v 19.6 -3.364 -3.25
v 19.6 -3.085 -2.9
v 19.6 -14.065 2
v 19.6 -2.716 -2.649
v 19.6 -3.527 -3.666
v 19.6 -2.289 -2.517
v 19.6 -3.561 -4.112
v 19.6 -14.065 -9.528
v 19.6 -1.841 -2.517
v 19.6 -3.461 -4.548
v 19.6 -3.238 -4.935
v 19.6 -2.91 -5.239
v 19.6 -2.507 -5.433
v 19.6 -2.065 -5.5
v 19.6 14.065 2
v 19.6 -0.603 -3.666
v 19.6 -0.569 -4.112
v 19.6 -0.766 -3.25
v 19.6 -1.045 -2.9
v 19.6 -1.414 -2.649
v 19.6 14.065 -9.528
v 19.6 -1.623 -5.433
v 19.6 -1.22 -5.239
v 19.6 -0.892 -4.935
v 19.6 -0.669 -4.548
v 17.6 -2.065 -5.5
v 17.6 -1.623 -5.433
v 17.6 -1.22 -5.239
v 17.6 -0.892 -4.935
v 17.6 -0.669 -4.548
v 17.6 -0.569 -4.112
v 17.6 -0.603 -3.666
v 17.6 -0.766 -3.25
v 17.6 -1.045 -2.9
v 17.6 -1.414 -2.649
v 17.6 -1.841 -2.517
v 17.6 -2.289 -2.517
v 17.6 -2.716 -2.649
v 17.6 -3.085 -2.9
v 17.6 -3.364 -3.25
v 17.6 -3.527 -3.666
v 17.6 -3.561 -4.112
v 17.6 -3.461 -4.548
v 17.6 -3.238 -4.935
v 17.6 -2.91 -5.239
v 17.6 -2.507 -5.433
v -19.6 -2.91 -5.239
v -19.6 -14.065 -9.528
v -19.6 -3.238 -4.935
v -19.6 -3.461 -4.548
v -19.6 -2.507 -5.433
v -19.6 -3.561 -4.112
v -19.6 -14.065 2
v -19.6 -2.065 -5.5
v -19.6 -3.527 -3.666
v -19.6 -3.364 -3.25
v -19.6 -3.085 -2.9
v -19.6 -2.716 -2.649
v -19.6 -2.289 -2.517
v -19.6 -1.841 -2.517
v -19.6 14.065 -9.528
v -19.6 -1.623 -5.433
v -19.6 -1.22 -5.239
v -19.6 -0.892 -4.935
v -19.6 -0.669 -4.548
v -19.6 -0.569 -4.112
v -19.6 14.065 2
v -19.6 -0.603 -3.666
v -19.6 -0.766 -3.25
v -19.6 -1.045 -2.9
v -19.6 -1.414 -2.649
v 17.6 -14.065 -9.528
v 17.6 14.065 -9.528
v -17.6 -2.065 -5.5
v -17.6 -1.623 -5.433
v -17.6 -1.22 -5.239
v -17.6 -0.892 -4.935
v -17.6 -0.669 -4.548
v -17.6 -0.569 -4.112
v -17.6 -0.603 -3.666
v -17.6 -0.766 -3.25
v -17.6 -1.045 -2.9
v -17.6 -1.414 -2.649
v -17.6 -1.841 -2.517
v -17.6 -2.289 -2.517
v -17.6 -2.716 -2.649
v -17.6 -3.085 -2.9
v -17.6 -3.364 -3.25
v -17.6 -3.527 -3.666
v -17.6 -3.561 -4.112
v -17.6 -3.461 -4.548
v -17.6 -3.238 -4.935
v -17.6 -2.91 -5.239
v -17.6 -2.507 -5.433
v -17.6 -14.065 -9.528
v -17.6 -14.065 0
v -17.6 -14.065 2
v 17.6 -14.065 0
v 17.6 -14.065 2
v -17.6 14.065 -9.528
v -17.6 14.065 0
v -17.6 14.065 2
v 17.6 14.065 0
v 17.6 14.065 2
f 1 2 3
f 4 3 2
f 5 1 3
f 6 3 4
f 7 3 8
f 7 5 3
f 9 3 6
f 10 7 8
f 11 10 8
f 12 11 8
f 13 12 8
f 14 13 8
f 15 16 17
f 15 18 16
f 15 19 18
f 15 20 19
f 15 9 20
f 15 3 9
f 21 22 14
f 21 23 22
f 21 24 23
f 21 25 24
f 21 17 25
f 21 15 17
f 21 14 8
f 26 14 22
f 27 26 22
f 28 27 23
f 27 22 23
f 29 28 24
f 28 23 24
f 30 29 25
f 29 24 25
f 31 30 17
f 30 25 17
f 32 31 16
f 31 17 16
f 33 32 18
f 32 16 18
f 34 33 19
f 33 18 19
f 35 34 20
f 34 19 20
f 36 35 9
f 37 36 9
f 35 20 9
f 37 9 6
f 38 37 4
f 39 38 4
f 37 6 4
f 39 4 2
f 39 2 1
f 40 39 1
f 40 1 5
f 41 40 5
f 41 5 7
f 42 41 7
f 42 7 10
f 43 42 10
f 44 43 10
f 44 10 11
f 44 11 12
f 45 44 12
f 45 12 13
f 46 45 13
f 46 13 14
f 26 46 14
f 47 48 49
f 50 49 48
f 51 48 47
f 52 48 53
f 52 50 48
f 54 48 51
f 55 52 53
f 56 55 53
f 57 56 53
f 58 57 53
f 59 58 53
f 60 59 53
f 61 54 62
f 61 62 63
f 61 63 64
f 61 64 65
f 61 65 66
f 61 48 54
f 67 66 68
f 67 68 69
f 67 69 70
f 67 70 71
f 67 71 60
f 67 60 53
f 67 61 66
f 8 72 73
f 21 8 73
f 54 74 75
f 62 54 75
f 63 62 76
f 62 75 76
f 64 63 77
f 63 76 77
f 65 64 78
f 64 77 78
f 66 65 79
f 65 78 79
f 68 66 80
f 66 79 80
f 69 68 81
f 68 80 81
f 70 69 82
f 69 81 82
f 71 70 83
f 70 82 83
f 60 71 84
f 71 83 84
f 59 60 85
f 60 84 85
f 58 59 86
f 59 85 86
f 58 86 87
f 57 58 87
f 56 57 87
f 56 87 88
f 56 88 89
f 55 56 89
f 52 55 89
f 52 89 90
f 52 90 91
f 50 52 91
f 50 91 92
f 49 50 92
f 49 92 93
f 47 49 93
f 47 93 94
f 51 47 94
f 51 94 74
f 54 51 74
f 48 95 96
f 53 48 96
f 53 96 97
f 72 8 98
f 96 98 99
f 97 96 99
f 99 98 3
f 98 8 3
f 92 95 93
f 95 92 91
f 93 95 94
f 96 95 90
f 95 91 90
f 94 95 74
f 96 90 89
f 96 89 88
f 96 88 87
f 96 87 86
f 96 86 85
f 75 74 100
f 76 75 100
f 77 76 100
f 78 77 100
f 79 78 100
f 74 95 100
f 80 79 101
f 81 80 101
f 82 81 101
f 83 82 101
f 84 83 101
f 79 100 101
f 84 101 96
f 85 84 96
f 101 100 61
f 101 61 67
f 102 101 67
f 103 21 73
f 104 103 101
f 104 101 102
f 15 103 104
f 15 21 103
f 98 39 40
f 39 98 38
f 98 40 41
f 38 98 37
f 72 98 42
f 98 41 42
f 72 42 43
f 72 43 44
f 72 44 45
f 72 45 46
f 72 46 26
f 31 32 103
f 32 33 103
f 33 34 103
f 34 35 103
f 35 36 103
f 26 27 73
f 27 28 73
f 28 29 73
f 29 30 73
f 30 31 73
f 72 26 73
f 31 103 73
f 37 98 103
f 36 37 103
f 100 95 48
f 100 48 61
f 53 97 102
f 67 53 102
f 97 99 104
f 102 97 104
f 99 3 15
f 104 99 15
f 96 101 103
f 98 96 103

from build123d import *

# Parameters (mm, degrees)
SKETCH1_W           = 35.2
SKETCH1_H           = 28.13
BOSS_EXTRUDE1_DEPTH = 2
SKETCH2_W           = 11.528235963
SKETCH2_H           = 28.13
BOSS_EXTRUDE2_DEPTH = 2
SKETCH3_W           = 11.528235963
SKETCH3_H           = 28.13
BOSS_EXTRUDE3_DEPTH = 2
SKETCH4_R           = 1.5
CUT_EXTRUDE1_DEPTH  = 43.722962275


with BuildPart() as part:
    # Sketch1 → Boss-Extrude1 (new body)
    with BuildSketch(Plane.XY):
        Rectangle(SKETCH1_W, SKETCH1_H)
    extrude(amount=BOSS_EXTRUDE1_DEPTH)

    # Sketch2 → Boss-Extrude2 (add)
    with BuildSketch(Plane(origin=(17.6, 0, 0), x_dir=(0, 0, -1), z_dir=(1, 0, 0))):
        with Locations((3.764117982, 0)):
            Rectangle(SKETCH2_W, SKETCH2_H)
    extrude(amount=BOSS_EXTRUDE2_DEPTH)

    # Sketch3 → Boss-Extrude3 (add)
    with BuildSketch(Plane.ZY.offset(17.6)):
        with Locations((-3.764117982, 0)):
            Rectangle(SKETCH3_W, SKETCH3_H)
    extrude(amount=BOSS_EXTRUDE3_DEPTH)

    # Sketch4 → Cut-Extrude1 (cut, through all)
    with BuildSketch(Plane(origin=(19.6, 0, 0), x_dir=(0, 0, -1), z_dir=(1, 0, 0))):
        with Locations((4, -2.065)):
            Circle(SKETCH4_R)
    extrude(amount=-CUT_EXTRUDE1_DEPTH, mode=Mode.SUBTRACT)


solid = part.part
